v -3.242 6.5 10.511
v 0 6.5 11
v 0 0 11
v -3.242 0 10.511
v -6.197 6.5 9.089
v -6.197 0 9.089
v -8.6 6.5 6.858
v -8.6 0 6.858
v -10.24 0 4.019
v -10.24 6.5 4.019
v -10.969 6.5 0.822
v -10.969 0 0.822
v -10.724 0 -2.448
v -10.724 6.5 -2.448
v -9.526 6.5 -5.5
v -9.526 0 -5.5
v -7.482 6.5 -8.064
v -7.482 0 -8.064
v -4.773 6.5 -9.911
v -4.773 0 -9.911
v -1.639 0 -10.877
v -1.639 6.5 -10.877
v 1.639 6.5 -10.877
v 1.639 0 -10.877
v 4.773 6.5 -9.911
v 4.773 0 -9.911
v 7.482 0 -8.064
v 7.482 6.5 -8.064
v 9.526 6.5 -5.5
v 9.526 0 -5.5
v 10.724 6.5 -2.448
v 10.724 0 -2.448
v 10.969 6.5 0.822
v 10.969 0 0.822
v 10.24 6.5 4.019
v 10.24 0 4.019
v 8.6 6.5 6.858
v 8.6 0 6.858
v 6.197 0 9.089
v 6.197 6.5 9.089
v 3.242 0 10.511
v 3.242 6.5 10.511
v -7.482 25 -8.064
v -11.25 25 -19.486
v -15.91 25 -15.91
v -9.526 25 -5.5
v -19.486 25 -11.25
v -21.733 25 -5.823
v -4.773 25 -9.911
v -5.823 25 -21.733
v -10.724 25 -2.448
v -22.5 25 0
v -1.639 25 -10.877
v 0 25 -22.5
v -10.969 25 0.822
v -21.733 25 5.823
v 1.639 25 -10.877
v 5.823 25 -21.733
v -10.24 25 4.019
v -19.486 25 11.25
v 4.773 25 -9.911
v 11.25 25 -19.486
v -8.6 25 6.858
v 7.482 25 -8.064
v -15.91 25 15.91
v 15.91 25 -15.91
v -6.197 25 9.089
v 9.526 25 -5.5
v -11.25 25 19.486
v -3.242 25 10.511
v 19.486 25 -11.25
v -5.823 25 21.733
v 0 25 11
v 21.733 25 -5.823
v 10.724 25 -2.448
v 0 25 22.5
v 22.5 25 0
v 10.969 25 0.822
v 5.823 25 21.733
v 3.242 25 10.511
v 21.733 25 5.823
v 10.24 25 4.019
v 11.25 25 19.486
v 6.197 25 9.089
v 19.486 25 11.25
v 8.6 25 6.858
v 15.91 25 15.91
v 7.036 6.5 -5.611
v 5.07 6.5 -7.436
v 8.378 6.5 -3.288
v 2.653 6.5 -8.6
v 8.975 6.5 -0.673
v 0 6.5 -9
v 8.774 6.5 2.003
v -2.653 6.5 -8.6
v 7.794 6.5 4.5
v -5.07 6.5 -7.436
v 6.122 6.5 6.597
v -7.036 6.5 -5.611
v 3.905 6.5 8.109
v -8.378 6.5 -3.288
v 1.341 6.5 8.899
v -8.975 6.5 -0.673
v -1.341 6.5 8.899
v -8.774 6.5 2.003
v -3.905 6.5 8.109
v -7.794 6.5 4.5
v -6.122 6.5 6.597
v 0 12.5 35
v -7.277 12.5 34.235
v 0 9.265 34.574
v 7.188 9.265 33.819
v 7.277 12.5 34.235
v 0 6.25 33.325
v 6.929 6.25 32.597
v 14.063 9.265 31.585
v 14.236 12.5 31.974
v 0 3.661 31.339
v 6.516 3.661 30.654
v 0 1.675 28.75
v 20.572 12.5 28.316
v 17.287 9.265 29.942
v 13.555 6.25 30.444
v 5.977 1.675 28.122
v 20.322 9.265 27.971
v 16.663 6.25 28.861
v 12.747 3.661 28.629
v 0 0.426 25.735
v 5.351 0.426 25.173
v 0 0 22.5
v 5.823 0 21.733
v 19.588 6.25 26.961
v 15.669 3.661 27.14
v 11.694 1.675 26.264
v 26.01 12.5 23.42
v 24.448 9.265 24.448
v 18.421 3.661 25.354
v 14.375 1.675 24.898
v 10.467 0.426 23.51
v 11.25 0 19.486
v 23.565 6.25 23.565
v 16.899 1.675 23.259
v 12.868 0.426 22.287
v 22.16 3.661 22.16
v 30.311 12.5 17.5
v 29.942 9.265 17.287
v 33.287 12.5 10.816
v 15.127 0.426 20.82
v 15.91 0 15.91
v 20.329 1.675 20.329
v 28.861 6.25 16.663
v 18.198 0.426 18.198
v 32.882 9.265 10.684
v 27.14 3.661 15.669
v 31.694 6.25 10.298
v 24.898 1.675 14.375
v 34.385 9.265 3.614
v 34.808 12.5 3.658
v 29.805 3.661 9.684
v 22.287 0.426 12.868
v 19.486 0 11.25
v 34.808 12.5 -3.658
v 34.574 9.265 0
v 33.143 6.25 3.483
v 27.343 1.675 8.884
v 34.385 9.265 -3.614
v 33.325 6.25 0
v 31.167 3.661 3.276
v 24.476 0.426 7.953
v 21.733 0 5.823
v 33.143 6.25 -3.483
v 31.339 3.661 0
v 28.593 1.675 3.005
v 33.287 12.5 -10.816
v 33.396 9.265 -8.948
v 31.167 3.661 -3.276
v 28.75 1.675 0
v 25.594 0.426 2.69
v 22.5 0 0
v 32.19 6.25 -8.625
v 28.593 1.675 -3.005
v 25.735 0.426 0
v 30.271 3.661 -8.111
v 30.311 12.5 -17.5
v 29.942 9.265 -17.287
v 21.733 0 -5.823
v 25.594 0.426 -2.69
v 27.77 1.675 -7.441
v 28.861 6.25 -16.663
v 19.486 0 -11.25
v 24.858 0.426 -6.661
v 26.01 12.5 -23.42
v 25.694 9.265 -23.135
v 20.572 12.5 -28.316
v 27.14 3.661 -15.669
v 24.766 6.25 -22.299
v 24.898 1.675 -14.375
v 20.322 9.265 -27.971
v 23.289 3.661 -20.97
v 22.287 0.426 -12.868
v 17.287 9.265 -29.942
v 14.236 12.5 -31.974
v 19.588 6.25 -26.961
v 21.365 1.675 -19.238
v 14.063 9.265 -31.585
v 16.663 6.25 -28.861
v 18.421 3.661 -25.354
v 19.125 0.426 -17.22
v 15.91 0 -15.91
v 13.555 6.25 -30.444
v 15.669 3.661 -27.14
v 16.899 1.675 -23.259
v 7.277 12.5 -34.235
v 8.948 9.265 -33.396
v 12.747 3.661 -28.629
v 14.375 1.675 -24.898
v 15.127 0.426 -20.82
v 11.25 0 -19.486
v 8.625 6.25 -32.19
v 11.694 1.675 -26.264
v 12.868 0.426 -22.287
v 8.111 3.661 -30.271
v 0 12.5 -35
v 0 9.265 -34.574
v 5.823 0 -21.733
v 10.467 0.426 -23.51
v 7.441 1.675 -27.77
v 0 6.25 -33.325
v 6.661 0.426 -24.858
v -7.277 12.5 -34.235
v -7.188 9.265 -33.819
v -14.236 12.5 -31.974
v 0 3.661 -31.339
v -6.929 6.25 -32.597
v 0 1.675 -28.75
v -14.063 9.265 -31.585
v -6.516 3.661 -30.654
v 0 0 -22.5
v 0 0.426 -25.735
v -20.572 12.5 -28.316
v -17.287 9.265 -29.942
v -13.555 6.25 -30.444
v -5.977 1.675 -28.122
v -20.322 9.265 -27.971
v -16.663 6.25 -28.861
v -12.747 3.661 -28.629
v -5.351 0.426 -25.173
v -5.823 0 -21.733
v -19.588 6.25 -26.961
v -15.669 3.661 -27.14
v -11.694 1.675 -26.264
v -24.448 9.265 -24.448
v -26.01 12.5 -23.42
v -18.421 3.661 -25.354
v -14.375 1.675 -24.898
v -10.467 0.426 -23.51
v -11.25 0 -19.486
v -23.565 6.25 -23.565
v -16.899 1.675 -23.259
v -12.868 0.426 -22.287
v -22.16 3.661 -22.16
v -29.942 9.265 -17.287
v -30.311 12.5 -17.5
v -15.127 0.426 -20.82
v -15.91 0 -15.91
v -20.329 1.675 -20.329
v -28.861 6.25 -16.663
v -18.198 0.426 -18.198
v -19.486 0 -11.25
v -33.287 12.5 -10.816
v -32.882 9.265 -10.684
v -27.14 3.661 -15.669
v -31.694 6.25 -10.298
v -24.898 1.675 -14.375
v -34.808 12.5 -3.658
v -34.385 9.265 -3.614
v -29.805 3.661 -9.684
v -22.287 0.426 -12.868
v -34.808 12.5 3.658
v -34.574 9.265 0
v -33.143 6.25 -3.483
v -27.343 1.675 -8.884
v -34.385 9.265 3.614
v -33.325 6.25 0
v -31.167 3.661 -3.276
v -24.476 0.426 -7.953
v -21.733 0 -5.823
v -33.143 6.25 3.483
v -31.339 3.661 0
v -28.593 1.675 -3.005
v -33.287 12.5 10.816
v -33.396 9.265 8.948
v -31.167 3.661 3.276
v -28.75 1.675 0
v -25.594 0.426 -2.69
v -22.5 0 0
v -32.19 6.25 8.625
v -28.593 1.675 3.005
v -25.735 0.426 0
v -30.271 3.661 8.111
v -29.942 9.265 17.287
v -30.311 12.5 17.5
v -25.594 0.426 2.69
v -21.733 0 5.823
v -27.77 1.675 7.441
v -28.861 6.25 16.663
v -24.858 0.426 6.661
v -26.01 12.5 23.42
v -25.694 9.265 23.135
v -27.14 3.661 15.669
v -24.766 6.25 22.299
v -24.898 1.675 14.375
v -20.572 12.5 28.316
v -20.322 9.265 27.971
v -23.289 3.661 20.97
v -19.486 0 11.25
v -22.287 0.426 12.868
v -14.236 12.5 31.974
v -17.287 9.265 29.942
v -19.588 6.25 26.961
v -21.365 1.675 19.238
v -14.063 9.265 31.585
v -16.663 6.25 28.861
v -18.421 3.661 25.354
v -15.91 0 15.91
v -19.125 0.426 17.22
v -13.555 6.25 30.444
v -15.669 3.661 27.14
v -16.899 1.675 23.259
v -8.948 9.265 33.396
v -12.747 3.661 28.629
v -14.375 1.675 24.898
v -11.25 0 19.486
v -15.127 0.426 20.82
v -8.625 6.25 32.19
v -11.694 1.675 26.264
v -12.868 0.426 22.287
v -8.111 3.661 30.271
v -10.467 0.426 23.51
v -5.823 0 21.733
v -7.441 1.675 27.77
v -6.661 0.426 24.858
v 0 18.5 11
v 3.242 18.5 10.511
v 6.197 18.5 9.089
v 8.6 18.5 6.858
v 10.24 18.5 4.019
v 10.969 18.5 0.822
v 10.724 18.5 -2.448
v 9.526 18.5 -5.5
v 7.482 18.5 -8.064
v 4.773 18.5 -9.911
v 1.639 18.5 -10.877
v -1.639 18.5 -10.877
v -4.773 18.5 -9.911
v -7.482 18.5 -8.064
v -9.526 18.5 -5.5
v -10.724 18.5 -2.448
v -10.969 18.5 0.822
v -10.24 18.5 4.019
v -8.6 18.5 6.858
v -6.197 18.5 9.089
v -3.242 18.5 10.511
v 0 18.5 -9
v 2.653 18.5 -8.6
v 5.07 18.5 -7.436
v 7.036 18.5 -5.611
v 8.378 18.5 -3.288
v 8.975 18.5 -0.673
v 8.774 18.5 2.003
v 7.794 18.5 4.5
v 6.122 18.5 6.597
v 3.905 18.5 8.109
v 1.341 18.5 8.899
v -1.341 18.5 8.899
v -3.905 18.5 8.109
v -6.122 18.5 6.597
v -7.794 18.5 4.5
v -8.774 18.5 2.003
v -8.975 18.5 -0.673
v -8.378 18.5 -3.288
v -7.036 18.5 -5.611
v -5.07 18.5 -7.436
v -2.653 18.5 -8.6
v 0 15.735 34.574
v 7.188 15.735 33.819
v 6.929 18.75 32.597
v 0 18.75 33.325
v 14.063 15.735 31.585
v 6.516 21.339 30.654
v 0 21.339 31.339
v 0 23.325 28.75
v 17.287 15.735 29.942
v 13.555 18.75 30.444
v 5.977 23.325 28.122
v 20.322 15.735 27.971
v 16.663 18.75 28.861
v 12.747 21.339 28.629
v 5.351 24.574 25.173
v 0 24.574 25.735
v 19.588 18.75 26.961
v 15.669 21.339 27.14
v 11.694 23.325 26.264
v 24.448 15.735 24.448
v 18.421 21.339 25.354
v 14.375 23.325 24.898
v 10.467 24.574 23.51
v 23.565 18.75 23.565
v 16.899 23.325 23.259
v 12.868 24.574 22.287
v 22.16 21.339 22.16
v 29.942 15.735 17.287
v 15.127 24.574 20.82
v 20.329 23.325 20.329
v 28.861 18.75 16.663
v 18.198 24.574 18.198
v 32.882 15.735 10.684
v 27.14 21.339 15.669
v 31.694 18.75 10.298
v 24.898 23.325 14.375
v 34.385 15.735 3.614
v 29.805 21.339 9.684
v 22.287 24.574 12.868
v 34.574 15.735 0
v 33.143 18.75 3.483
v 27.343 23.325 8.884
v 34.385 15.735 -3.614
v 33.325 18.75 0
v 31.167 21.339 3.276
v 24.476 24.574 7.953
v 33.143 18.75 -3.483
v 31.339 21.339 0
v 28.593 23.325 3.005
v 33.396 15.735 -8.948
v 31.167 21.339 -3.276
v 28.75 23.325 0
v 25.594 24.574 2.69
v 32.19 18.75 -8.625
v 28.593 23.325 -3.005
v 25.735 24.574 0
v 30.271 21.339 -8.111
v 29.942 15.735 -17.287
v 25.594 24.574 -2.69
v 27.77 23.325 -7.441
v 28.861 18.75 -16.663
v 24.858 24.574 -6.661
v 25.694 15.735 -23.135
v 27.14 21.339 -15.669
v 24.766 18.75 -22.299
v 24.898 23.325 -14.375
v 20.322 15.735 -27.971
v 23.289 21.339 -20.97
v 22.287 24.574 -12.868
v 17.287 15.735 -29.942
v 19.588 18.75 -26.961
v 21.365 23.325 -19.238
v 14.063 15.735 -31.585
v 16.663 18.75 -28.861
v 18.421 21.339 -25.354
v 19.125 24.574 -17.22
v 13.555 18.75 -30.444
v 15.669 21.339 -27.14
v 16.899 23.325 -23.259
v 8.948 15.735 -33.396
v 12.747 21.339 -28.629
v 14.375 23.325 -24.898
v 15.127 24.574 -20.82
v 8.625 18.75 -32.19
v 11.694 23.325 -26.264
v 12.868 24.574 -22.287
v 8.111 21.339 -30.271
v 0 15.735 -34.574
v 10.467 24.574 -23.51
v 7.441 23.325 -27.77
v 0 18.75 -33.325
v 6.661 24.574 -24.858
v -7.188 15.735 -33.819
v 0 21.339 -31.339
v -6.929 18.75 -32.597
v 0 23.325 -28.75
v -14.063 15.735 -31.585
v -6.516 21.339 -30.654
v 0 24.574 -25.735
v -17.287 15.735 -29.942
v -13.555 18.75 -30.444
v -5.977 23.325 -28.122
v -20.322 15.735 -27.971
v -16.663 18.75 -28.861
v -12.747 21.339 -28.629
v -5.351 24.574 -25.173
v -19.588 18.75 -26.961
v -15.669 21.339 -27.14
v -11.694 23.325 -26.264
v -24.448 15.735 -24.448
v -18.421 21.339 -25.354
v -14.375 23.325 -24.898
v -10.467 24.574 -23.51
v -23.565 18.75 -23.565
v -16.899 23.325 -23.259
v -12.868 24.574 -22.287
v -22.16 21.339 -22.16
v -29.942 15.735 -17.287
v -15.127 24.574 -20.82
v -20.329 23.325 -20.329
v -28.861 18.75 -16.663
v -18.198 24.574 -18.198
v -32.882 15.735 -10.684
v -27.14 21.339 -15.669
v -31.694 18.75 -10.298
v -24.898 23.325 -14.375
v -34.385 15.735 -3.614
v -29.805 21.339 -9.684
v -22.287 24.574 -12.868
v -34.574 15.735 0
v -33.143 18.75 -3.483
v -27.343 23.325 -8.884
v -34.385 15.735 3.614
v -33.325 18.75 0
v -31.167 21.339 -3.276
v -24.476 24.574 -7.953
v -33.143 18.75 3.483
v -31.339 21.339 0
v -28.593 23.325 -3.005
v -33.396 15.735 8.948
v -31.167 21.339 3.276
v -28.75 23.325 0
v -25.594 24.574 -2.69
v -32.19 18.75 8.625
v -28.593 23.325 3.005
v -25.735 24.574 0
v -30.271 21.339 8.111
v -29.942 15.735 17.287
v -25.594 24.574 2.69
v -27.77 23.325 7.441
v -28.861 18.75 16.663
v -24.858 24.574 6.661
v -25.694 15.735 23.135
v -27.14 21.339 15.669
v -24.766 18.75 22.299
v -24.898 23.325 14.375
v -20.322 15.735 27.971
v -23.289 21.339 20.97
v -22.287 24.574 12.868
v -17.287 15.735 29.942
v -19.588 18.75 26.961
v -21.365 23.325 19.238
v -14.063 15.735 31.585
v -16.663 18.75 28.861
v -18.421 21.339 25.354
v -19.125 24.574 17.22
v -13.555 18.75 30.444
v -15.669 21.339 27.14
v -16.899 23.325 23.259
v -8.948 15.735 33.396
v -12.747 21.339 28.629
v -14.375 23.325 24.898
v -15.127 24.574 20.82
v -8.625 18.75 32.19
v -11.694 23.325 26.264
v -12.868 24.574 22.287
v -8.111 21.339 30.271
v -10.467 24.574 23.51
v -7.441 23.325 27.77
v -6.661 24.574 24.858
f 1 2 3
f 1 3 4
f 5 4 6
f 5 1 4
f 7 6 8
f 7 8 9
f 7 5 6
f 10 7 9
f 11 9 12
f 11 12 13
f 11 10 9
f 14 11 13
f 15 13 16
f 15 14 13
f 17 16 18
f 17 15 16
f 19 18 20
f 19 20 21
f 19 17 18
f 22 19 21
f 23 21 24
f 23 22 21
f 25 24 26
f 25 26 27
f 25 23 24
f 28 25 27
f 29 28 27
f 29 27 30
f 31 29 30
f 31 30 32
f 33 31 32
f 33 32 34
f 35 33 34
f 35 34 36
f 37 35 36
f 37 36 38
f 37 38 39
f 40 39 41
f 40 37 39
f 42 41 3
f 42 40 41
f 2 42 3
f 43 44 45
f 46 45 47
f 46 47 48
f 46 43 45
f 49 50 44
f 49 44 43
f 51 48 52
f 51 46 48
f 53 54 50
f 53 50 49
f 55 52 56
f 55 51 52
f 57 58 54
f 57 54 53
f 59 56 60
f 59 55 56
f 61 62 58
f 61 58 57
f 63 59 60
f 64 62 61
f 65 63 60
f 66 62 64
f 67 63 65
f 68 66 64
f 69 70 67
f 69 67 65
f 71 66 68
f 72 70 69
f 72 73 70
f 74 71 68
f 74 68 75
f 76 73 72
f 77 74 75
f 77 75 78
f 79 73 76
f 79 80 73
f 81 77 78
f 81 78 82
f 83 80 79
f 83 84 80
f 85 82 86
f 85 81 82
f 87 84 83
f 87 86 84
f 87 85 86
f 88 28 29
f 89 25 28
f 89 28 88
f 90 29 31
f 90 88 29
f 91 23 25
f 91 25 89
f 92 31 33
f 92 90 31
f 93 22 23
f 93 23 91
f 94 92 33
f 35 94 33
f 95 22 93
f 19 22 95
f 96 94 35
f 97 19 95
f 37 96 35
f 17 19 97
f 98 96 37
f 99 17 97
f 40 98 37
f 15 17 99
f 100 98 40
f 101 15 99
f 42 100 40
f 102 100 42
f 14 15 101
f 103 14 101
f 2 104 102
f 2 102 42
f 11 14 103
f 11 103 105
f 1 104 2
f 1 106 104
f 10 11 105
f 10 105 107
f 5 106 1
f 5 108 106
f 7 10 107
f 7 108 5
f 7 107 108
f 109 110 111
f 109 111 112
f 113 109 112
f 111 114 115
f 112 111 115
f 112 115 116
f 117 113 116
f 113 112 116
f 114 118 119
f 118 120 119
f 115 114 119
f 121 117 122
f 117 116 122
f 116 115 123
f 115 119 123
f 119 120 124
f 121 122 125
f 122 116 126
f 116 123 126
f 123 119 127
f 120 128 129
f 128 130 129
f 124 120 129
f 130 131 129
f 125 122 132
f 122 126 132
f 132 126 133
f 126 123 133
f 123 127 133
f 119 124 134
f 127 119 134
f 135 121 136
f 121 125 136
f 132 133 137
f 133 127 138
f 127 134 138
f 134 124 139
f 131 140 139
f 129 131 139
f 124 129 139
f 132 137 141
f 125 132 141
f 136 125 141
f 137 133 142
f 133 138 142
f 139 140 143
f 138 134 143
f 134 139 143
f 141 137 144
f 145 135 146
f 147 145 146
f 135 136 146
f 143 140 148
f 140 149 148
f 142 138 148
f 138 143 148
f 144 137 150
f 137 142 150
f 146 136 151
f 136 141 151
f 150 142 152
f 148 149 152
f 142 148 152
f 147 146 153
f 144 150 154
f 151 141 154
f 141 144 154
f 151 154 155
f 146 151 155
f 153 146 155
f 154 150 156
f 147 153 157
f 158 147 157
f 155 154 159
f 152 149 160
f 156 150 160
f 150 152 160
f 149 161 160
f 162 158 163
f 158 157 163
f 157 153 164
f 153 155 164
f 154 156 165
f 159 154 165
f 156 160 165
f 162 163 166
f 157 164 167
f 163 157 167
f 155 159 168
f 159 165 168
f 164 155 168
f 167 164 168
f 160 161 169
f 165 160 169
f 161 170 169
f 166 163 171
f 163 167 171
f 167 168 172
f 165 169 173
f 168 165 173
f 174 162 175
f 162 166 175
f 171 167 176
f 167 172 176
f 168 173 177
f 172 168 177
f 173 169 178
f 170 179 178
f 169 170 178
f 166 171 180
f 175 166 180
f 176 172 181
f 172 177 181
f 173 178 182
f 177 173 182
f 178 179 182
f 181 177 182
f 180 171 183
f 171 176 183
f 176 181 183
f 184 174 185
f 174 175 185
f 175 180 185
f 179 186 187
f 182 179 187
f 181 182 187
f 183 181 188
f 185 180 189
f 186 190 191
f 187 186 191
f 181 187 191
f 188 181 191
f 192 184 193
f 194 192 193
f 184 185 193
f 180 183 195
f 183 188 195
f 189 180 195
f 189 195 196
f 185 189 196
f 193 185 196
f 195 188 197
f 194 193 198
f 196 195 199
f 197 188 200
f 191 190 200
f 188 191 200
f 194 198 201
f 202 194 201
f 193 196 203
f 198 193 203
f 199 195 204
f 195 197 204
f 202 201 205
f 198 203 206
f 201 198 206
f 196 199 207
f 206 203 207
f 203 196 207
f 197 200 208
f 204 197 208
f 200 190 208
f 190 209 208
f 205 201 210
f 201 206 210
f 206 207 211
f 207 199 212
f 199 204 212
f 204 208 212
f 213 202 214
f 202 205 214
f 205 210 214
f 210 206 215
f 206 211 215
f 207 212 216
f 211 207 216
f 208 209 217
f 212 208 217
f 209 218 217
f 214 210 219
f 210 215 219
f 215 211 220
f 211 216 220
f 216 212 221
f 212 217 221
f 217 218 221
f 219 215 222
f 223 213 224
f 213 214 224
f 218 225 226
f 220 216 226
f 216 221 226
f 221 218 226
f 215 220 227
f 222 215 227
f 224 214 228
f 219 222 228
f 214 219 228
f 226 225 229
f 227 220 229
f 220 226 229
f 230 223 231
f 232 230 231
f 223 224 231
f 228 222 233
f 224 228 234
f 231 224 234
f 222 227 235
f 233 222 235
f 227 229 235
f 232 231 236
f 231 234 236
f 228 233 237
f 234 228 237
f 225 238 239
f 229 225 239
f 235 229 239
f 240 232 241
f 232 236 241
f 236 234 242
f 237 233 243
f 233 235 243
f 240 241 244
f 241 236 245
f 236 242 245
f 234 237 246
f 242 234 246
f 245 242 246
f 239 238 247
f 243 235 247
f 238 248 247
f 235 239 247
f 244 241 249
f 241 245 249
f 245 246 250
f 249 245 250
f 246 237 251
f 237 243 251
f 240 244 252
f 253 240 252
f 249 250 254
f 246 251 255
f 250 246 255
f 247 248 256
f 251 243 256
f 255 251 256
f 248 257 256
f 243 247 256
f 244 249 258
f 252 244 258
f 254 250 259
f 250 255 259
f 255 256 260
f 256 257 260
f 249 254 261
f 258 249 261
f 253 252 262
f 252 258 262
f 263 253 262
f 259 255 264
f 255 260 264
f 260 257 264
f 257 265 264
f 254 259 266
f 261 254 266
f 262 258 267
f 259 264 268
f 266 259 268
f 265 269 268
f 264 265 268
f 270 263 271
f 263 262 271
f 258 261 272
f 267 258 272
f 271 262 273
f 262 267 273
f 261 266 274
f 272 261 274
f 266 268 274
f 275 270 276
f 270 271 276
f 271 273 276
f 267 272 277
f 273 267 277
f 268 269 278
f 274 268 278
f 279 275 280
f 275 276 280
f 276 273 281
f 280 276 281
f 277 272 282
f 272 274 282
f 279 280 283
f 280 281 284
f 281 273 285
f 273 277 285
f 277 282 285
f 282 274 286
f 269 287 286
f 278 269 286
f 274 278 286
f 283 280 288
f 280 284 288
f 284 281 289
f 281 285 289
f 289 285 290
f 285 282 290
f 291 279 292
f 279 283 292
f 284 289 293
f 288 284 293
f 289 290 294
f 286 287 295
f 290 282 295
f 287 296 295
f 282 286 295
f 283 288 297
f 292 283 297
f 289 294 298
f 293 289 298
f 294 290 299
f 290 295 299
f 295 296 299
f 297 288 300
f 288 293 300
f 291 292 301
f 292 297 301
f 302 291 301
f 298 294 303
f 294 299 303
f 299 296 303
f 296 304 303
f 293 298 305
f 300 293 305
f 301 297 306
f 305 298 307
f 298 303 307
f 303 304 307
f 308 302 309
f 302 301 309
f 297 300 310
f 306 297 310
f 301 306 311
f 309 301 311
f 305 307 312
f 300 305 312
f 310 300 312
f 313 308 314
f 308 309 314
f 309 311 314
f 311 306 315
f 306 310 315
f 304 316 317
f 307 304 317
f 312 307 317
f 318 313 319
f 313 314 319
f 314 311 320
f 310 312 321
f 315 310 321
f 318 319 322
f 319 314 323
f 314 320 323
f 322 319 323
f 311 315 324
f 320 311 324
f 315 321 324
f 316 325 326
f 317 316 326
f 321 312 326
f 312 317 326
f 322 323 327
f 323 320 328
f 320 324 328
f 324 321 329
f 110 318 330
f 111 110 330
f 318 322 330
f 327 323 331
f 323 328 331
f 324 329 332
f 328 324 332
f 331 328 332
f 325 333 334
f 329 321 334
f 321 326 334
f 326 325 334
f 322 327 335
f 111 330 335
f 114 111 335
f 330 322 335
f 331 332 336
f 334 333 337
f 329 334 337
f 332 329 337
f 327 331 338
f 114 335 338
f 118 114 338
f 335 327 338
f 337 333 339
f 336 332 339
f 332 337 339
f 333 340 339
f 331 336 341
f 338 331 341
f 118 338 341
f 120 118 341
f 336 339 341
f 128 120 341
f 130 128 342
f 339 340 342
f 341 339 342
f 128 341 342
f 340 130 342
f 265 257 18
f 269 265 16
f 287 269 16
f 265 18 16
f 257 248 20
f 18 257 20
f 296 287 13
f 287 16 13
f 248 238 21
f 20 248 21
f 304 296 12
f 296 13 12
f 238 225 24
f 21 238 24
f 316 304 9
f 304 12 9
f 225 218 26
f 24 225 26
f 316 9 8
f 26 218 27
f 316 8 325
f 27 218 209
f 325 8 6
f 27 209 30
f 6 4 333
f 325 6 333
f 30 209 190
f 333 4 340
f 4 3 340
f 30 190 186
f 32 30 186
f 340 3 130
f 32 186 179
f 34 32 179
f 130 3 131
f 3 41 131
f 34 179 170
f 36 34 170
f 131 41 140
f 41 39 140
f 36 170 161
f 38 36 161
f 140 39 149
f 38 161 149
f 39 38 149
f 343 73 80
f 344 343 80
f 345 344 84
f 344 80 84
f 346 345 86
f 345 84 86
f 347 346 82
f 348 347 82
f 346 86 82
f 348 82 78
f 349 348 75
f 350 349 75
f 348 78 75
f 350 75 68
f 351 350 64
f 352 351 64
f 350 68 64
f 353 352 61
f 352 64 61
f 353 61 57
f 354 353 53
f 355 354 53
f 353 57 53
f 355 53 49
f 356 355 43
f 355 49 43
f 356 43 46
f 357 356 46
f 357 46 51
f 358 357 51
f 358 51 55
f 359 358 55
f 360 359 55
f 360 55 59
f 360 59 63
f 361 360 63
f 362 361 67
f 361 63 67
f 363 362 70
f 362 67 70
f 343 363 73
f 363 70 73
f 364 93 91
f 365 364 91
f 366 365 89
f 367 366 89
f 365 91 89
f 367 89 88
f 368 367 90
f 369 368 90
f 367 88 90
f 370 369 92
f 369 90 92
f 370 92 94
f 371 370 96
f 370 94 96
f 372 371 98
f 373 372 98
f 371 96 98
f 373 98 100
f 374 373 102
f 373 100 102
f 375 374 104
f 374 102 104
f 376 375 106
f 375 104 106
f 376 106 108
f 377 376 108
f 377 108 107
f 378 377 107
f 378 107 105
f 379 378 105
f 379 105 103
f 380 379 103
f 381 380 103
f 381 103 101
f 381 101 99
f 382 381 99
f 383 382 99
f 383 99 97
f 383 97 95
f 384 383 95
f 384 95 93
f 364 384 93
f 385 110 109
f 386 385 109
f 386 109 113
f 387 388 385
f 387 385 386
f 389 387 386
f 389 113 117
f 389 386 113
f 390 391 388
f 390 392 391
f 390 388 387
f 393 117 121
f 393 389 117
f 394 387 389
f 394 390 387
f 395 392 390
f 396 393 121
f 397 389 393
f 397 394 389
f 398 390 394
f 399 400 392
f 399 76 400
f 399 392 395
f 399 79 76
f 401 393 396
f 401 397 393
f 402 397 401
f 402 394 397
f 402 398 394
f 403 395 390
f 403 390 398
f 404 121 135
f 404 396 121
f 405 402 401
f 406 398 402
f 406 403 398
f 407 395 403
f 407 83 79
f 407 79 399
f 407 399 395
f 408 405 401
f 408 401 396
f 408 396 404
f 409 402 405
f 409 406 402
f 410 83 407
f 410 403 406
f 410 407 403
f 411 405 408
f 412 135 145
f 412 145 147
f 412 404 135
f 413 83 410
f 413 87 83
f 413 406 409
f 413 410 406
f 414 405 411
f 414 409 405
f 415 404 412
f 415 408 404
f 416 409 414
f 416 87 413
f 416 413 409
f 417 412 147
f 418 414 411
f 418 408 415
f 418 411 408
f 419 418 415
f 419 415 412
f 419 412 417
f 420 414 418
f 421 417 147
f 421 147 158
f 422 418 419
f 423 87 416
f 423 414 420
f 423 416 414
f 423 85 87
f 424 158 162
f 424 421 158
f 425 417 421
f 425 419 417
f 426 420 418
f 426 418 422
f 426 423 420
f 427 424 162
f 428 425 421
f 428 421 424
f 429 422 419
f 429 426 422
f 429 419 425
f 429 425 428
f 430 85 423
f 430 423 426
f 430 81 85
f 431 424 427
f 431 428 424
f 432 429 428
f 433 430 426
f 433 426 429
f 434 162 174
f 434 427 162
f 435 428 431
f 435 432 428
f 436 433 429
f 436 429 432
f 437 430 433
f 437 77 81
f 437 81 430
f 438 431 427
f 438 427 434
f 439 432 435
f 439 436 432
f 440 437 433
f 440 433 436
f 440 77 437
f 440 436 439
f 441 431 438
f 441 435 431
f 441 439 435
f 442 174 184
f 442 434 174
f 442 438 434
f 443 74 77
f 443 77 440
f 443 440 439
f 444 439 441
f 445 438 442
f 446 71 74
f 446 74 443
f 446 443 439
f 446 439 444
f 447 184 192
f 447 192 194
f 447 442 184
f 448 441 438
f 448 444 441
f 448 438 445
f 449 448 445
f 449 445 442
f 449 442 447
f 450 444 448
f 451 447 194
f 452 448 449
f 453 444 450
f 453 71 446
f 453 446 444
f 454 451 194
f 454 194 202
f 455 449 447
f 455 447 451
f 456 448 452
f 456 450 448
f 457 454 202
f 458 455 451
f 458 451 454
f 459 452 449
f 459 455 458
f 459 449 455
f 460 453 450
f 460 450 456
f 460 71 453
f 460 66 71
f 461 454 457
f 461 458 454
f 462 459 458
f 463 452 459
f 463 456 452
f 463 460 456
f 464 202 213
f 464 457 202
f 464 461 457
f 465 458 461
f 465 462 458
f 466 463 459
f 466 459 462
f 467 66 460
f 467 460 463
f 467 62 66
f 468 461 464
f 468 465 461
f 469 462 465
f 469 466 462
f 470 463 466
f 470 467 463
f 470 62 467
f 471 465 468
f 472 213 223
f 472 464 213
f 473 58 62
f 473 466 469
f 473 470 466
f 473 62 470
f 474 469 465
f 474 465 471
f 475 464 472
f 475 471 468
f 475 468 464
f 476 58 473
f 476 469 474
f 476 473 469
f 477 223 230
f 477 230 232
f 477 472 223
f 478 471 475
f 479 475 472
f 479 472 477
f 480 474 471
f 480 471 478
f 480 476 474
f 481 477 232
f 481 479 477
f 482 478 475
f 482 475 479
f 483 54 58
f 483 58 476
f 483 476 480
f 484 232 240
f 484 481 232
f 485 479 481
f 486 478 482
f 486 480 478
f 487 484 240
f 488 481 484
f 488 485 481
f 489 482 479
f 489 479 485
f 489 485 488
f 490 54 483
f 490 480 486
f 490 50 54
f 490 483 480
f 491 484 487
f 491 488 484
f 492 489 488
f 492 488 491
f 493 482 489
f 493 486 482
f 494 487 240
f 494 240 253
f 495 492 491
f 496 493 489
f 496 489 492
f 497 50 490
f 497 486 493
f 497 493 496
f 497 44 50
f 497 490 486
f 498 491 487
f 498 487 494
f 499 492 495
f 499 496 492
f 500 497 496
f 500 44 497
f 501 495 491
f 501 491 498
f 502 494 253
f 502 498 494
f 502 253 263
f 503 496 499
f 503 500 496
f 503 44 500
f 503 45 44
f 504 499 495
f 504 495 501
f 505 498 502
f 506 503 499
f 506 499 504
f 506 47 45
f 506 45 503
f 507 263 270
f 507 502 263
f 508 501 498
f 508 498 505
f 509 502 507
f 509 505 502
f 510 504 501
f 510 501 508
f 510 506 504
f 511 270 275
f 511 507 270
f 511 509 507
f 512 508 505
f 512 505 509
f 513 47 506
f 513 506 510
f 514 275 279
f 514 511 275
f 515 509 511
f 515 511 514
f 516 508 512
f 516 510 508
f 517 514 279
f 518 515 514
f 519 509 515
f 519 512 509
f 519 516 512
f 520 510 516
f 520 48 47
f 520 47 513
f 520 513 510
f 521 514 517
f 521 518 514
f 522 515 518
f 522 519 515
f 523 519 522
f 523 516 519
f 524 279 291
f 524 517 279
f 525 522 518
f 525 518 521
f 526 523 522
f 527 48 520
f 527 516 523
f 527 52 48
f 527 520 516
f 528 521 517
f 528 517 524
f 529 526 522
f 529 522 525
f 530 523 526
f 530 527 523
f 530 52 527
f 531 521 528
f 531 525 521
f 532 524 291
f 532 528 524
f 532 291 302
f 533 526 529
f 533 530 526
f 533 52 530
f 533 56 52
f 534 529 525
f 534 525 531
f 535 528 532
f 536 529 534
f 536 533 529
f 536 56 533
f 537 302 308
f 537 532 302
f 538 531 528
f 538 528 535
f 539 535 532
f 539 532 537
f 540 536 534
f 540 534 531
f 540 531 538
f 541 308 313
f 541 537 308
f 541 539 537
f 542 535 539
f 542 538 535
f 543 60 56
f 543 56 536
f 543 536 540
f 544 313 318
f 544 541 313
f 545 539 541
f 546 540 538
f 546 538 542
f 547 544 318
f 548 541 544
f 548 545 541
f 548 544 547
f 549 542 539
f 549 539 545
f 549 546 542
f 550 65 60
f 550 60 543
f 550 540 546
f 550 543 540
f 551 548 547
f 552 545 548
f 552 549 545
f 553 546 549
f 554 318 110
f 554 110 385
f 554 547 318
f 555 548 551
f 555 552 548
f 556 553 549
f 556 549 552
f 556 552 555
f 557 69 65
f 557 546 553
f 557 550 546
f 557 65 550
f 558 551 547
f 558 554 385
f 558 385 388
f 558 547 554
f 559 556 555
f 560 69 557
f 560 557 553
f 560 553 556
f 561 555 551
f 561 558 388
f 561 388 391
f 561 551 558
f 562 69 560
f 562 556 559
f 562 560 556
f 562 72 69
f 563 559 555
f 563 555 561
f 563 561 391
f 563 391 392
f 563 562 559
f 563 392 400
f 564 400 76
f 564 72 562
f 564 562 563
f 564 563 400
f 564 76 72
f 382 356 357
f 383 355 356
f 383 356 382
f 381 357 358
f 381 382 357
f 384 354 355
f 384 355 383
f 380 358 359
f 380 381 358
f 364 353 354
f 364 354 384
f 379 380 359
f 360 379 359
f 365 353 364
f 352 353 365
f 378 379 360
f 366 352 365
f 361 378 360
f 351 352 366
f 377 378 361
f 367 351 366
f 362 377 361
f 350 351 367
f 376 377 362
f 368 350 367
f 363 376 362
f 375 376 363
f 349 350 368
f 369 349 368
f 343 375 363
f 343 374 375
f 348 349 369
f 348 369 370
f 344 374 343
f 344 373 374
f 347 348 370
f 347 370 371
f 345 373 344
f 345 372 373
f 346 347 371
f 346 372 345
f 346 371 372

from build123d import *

# Parameters (mm, degrees)
SKETCH1_R           = 35
BOSS_EXTRUDE1_DEPTH = 25
FILLET1_R           = 12.5
SKETCH2_R           = 11
CUT_EXTRUDE1_DEPTH  = 6.5
CUT_EXTRUDE2_START  = -6.5
SKETCH3_R           = 11
CUT_EXTRUDE2_DEPTH  = 6.5
SKETCH4_R           = 9
CUT_EXTRUDE3_DEPTH  = 53.841744861


with BuildPart() as part:
    # Sketch1 → Boss-Extrude1 (new body)
    with BuildSketch(Plane(origin=(0, 0, 0), x_dir=(1, 0, 0), z_dir=(0, 1, 0))):
        with Locations(Location((0, 0, 0), (0, 0, 270))):
            Circle(SKETCH1_R)
    extrude(amount=BOSS_EXTRUDE1_DEPTH)

    # Fillet1
    fillet1_edges = [part.edges().sort_by_distance(p)[0] for p in [
        (0, 0, -35),
        (0, 25, -35),
    ]]
    fillet(fillet1_edges, radius=FILLET1_R - 0.0001)  # a hair under: the kernel refuses the full size

    # Sketch2 → Cut-Extrude1 (cut)
    with BuildSketch(Plane(origin=(0, 25, 0), x_dir=(1, 0, 0), z_dir=(0, 1, 0))):
        with Locations(Location((0, 0, 0), (0, 0, 270))):
            Circle(SKETCH2_R)
    extrude(amount=-CUT_EXTRUDE1_DEPTH, mode=Mode.SUBTRACT)

    # Sketch3 → Cut-Extrude2 (cut)
    with BuildSketch(Plane.XZ.offset(CUT_EXTRUDE2_START)):
        with Locations(Location((0, 0, 0), (0, 0, 90))):
            Circle(SKETCH3_R)
    extrude(amount=CUT_EXTRUDE2_DEPTH, mode=Mode.SUBTRACT)

    # Sketch4 → Cut-Extrude3 (cut, through all)
    with BuildSketch(Plane.XZ.offset(-6.5)):
        with Locations(Location((0, 0, 0), (0, 0, 270))):
            Circle(SKETCH4_R)
    extrude(amount=-CUT_EXTRUDE3_DEPTH, mode=Mode.SUBTRACT)


solid = part.part
